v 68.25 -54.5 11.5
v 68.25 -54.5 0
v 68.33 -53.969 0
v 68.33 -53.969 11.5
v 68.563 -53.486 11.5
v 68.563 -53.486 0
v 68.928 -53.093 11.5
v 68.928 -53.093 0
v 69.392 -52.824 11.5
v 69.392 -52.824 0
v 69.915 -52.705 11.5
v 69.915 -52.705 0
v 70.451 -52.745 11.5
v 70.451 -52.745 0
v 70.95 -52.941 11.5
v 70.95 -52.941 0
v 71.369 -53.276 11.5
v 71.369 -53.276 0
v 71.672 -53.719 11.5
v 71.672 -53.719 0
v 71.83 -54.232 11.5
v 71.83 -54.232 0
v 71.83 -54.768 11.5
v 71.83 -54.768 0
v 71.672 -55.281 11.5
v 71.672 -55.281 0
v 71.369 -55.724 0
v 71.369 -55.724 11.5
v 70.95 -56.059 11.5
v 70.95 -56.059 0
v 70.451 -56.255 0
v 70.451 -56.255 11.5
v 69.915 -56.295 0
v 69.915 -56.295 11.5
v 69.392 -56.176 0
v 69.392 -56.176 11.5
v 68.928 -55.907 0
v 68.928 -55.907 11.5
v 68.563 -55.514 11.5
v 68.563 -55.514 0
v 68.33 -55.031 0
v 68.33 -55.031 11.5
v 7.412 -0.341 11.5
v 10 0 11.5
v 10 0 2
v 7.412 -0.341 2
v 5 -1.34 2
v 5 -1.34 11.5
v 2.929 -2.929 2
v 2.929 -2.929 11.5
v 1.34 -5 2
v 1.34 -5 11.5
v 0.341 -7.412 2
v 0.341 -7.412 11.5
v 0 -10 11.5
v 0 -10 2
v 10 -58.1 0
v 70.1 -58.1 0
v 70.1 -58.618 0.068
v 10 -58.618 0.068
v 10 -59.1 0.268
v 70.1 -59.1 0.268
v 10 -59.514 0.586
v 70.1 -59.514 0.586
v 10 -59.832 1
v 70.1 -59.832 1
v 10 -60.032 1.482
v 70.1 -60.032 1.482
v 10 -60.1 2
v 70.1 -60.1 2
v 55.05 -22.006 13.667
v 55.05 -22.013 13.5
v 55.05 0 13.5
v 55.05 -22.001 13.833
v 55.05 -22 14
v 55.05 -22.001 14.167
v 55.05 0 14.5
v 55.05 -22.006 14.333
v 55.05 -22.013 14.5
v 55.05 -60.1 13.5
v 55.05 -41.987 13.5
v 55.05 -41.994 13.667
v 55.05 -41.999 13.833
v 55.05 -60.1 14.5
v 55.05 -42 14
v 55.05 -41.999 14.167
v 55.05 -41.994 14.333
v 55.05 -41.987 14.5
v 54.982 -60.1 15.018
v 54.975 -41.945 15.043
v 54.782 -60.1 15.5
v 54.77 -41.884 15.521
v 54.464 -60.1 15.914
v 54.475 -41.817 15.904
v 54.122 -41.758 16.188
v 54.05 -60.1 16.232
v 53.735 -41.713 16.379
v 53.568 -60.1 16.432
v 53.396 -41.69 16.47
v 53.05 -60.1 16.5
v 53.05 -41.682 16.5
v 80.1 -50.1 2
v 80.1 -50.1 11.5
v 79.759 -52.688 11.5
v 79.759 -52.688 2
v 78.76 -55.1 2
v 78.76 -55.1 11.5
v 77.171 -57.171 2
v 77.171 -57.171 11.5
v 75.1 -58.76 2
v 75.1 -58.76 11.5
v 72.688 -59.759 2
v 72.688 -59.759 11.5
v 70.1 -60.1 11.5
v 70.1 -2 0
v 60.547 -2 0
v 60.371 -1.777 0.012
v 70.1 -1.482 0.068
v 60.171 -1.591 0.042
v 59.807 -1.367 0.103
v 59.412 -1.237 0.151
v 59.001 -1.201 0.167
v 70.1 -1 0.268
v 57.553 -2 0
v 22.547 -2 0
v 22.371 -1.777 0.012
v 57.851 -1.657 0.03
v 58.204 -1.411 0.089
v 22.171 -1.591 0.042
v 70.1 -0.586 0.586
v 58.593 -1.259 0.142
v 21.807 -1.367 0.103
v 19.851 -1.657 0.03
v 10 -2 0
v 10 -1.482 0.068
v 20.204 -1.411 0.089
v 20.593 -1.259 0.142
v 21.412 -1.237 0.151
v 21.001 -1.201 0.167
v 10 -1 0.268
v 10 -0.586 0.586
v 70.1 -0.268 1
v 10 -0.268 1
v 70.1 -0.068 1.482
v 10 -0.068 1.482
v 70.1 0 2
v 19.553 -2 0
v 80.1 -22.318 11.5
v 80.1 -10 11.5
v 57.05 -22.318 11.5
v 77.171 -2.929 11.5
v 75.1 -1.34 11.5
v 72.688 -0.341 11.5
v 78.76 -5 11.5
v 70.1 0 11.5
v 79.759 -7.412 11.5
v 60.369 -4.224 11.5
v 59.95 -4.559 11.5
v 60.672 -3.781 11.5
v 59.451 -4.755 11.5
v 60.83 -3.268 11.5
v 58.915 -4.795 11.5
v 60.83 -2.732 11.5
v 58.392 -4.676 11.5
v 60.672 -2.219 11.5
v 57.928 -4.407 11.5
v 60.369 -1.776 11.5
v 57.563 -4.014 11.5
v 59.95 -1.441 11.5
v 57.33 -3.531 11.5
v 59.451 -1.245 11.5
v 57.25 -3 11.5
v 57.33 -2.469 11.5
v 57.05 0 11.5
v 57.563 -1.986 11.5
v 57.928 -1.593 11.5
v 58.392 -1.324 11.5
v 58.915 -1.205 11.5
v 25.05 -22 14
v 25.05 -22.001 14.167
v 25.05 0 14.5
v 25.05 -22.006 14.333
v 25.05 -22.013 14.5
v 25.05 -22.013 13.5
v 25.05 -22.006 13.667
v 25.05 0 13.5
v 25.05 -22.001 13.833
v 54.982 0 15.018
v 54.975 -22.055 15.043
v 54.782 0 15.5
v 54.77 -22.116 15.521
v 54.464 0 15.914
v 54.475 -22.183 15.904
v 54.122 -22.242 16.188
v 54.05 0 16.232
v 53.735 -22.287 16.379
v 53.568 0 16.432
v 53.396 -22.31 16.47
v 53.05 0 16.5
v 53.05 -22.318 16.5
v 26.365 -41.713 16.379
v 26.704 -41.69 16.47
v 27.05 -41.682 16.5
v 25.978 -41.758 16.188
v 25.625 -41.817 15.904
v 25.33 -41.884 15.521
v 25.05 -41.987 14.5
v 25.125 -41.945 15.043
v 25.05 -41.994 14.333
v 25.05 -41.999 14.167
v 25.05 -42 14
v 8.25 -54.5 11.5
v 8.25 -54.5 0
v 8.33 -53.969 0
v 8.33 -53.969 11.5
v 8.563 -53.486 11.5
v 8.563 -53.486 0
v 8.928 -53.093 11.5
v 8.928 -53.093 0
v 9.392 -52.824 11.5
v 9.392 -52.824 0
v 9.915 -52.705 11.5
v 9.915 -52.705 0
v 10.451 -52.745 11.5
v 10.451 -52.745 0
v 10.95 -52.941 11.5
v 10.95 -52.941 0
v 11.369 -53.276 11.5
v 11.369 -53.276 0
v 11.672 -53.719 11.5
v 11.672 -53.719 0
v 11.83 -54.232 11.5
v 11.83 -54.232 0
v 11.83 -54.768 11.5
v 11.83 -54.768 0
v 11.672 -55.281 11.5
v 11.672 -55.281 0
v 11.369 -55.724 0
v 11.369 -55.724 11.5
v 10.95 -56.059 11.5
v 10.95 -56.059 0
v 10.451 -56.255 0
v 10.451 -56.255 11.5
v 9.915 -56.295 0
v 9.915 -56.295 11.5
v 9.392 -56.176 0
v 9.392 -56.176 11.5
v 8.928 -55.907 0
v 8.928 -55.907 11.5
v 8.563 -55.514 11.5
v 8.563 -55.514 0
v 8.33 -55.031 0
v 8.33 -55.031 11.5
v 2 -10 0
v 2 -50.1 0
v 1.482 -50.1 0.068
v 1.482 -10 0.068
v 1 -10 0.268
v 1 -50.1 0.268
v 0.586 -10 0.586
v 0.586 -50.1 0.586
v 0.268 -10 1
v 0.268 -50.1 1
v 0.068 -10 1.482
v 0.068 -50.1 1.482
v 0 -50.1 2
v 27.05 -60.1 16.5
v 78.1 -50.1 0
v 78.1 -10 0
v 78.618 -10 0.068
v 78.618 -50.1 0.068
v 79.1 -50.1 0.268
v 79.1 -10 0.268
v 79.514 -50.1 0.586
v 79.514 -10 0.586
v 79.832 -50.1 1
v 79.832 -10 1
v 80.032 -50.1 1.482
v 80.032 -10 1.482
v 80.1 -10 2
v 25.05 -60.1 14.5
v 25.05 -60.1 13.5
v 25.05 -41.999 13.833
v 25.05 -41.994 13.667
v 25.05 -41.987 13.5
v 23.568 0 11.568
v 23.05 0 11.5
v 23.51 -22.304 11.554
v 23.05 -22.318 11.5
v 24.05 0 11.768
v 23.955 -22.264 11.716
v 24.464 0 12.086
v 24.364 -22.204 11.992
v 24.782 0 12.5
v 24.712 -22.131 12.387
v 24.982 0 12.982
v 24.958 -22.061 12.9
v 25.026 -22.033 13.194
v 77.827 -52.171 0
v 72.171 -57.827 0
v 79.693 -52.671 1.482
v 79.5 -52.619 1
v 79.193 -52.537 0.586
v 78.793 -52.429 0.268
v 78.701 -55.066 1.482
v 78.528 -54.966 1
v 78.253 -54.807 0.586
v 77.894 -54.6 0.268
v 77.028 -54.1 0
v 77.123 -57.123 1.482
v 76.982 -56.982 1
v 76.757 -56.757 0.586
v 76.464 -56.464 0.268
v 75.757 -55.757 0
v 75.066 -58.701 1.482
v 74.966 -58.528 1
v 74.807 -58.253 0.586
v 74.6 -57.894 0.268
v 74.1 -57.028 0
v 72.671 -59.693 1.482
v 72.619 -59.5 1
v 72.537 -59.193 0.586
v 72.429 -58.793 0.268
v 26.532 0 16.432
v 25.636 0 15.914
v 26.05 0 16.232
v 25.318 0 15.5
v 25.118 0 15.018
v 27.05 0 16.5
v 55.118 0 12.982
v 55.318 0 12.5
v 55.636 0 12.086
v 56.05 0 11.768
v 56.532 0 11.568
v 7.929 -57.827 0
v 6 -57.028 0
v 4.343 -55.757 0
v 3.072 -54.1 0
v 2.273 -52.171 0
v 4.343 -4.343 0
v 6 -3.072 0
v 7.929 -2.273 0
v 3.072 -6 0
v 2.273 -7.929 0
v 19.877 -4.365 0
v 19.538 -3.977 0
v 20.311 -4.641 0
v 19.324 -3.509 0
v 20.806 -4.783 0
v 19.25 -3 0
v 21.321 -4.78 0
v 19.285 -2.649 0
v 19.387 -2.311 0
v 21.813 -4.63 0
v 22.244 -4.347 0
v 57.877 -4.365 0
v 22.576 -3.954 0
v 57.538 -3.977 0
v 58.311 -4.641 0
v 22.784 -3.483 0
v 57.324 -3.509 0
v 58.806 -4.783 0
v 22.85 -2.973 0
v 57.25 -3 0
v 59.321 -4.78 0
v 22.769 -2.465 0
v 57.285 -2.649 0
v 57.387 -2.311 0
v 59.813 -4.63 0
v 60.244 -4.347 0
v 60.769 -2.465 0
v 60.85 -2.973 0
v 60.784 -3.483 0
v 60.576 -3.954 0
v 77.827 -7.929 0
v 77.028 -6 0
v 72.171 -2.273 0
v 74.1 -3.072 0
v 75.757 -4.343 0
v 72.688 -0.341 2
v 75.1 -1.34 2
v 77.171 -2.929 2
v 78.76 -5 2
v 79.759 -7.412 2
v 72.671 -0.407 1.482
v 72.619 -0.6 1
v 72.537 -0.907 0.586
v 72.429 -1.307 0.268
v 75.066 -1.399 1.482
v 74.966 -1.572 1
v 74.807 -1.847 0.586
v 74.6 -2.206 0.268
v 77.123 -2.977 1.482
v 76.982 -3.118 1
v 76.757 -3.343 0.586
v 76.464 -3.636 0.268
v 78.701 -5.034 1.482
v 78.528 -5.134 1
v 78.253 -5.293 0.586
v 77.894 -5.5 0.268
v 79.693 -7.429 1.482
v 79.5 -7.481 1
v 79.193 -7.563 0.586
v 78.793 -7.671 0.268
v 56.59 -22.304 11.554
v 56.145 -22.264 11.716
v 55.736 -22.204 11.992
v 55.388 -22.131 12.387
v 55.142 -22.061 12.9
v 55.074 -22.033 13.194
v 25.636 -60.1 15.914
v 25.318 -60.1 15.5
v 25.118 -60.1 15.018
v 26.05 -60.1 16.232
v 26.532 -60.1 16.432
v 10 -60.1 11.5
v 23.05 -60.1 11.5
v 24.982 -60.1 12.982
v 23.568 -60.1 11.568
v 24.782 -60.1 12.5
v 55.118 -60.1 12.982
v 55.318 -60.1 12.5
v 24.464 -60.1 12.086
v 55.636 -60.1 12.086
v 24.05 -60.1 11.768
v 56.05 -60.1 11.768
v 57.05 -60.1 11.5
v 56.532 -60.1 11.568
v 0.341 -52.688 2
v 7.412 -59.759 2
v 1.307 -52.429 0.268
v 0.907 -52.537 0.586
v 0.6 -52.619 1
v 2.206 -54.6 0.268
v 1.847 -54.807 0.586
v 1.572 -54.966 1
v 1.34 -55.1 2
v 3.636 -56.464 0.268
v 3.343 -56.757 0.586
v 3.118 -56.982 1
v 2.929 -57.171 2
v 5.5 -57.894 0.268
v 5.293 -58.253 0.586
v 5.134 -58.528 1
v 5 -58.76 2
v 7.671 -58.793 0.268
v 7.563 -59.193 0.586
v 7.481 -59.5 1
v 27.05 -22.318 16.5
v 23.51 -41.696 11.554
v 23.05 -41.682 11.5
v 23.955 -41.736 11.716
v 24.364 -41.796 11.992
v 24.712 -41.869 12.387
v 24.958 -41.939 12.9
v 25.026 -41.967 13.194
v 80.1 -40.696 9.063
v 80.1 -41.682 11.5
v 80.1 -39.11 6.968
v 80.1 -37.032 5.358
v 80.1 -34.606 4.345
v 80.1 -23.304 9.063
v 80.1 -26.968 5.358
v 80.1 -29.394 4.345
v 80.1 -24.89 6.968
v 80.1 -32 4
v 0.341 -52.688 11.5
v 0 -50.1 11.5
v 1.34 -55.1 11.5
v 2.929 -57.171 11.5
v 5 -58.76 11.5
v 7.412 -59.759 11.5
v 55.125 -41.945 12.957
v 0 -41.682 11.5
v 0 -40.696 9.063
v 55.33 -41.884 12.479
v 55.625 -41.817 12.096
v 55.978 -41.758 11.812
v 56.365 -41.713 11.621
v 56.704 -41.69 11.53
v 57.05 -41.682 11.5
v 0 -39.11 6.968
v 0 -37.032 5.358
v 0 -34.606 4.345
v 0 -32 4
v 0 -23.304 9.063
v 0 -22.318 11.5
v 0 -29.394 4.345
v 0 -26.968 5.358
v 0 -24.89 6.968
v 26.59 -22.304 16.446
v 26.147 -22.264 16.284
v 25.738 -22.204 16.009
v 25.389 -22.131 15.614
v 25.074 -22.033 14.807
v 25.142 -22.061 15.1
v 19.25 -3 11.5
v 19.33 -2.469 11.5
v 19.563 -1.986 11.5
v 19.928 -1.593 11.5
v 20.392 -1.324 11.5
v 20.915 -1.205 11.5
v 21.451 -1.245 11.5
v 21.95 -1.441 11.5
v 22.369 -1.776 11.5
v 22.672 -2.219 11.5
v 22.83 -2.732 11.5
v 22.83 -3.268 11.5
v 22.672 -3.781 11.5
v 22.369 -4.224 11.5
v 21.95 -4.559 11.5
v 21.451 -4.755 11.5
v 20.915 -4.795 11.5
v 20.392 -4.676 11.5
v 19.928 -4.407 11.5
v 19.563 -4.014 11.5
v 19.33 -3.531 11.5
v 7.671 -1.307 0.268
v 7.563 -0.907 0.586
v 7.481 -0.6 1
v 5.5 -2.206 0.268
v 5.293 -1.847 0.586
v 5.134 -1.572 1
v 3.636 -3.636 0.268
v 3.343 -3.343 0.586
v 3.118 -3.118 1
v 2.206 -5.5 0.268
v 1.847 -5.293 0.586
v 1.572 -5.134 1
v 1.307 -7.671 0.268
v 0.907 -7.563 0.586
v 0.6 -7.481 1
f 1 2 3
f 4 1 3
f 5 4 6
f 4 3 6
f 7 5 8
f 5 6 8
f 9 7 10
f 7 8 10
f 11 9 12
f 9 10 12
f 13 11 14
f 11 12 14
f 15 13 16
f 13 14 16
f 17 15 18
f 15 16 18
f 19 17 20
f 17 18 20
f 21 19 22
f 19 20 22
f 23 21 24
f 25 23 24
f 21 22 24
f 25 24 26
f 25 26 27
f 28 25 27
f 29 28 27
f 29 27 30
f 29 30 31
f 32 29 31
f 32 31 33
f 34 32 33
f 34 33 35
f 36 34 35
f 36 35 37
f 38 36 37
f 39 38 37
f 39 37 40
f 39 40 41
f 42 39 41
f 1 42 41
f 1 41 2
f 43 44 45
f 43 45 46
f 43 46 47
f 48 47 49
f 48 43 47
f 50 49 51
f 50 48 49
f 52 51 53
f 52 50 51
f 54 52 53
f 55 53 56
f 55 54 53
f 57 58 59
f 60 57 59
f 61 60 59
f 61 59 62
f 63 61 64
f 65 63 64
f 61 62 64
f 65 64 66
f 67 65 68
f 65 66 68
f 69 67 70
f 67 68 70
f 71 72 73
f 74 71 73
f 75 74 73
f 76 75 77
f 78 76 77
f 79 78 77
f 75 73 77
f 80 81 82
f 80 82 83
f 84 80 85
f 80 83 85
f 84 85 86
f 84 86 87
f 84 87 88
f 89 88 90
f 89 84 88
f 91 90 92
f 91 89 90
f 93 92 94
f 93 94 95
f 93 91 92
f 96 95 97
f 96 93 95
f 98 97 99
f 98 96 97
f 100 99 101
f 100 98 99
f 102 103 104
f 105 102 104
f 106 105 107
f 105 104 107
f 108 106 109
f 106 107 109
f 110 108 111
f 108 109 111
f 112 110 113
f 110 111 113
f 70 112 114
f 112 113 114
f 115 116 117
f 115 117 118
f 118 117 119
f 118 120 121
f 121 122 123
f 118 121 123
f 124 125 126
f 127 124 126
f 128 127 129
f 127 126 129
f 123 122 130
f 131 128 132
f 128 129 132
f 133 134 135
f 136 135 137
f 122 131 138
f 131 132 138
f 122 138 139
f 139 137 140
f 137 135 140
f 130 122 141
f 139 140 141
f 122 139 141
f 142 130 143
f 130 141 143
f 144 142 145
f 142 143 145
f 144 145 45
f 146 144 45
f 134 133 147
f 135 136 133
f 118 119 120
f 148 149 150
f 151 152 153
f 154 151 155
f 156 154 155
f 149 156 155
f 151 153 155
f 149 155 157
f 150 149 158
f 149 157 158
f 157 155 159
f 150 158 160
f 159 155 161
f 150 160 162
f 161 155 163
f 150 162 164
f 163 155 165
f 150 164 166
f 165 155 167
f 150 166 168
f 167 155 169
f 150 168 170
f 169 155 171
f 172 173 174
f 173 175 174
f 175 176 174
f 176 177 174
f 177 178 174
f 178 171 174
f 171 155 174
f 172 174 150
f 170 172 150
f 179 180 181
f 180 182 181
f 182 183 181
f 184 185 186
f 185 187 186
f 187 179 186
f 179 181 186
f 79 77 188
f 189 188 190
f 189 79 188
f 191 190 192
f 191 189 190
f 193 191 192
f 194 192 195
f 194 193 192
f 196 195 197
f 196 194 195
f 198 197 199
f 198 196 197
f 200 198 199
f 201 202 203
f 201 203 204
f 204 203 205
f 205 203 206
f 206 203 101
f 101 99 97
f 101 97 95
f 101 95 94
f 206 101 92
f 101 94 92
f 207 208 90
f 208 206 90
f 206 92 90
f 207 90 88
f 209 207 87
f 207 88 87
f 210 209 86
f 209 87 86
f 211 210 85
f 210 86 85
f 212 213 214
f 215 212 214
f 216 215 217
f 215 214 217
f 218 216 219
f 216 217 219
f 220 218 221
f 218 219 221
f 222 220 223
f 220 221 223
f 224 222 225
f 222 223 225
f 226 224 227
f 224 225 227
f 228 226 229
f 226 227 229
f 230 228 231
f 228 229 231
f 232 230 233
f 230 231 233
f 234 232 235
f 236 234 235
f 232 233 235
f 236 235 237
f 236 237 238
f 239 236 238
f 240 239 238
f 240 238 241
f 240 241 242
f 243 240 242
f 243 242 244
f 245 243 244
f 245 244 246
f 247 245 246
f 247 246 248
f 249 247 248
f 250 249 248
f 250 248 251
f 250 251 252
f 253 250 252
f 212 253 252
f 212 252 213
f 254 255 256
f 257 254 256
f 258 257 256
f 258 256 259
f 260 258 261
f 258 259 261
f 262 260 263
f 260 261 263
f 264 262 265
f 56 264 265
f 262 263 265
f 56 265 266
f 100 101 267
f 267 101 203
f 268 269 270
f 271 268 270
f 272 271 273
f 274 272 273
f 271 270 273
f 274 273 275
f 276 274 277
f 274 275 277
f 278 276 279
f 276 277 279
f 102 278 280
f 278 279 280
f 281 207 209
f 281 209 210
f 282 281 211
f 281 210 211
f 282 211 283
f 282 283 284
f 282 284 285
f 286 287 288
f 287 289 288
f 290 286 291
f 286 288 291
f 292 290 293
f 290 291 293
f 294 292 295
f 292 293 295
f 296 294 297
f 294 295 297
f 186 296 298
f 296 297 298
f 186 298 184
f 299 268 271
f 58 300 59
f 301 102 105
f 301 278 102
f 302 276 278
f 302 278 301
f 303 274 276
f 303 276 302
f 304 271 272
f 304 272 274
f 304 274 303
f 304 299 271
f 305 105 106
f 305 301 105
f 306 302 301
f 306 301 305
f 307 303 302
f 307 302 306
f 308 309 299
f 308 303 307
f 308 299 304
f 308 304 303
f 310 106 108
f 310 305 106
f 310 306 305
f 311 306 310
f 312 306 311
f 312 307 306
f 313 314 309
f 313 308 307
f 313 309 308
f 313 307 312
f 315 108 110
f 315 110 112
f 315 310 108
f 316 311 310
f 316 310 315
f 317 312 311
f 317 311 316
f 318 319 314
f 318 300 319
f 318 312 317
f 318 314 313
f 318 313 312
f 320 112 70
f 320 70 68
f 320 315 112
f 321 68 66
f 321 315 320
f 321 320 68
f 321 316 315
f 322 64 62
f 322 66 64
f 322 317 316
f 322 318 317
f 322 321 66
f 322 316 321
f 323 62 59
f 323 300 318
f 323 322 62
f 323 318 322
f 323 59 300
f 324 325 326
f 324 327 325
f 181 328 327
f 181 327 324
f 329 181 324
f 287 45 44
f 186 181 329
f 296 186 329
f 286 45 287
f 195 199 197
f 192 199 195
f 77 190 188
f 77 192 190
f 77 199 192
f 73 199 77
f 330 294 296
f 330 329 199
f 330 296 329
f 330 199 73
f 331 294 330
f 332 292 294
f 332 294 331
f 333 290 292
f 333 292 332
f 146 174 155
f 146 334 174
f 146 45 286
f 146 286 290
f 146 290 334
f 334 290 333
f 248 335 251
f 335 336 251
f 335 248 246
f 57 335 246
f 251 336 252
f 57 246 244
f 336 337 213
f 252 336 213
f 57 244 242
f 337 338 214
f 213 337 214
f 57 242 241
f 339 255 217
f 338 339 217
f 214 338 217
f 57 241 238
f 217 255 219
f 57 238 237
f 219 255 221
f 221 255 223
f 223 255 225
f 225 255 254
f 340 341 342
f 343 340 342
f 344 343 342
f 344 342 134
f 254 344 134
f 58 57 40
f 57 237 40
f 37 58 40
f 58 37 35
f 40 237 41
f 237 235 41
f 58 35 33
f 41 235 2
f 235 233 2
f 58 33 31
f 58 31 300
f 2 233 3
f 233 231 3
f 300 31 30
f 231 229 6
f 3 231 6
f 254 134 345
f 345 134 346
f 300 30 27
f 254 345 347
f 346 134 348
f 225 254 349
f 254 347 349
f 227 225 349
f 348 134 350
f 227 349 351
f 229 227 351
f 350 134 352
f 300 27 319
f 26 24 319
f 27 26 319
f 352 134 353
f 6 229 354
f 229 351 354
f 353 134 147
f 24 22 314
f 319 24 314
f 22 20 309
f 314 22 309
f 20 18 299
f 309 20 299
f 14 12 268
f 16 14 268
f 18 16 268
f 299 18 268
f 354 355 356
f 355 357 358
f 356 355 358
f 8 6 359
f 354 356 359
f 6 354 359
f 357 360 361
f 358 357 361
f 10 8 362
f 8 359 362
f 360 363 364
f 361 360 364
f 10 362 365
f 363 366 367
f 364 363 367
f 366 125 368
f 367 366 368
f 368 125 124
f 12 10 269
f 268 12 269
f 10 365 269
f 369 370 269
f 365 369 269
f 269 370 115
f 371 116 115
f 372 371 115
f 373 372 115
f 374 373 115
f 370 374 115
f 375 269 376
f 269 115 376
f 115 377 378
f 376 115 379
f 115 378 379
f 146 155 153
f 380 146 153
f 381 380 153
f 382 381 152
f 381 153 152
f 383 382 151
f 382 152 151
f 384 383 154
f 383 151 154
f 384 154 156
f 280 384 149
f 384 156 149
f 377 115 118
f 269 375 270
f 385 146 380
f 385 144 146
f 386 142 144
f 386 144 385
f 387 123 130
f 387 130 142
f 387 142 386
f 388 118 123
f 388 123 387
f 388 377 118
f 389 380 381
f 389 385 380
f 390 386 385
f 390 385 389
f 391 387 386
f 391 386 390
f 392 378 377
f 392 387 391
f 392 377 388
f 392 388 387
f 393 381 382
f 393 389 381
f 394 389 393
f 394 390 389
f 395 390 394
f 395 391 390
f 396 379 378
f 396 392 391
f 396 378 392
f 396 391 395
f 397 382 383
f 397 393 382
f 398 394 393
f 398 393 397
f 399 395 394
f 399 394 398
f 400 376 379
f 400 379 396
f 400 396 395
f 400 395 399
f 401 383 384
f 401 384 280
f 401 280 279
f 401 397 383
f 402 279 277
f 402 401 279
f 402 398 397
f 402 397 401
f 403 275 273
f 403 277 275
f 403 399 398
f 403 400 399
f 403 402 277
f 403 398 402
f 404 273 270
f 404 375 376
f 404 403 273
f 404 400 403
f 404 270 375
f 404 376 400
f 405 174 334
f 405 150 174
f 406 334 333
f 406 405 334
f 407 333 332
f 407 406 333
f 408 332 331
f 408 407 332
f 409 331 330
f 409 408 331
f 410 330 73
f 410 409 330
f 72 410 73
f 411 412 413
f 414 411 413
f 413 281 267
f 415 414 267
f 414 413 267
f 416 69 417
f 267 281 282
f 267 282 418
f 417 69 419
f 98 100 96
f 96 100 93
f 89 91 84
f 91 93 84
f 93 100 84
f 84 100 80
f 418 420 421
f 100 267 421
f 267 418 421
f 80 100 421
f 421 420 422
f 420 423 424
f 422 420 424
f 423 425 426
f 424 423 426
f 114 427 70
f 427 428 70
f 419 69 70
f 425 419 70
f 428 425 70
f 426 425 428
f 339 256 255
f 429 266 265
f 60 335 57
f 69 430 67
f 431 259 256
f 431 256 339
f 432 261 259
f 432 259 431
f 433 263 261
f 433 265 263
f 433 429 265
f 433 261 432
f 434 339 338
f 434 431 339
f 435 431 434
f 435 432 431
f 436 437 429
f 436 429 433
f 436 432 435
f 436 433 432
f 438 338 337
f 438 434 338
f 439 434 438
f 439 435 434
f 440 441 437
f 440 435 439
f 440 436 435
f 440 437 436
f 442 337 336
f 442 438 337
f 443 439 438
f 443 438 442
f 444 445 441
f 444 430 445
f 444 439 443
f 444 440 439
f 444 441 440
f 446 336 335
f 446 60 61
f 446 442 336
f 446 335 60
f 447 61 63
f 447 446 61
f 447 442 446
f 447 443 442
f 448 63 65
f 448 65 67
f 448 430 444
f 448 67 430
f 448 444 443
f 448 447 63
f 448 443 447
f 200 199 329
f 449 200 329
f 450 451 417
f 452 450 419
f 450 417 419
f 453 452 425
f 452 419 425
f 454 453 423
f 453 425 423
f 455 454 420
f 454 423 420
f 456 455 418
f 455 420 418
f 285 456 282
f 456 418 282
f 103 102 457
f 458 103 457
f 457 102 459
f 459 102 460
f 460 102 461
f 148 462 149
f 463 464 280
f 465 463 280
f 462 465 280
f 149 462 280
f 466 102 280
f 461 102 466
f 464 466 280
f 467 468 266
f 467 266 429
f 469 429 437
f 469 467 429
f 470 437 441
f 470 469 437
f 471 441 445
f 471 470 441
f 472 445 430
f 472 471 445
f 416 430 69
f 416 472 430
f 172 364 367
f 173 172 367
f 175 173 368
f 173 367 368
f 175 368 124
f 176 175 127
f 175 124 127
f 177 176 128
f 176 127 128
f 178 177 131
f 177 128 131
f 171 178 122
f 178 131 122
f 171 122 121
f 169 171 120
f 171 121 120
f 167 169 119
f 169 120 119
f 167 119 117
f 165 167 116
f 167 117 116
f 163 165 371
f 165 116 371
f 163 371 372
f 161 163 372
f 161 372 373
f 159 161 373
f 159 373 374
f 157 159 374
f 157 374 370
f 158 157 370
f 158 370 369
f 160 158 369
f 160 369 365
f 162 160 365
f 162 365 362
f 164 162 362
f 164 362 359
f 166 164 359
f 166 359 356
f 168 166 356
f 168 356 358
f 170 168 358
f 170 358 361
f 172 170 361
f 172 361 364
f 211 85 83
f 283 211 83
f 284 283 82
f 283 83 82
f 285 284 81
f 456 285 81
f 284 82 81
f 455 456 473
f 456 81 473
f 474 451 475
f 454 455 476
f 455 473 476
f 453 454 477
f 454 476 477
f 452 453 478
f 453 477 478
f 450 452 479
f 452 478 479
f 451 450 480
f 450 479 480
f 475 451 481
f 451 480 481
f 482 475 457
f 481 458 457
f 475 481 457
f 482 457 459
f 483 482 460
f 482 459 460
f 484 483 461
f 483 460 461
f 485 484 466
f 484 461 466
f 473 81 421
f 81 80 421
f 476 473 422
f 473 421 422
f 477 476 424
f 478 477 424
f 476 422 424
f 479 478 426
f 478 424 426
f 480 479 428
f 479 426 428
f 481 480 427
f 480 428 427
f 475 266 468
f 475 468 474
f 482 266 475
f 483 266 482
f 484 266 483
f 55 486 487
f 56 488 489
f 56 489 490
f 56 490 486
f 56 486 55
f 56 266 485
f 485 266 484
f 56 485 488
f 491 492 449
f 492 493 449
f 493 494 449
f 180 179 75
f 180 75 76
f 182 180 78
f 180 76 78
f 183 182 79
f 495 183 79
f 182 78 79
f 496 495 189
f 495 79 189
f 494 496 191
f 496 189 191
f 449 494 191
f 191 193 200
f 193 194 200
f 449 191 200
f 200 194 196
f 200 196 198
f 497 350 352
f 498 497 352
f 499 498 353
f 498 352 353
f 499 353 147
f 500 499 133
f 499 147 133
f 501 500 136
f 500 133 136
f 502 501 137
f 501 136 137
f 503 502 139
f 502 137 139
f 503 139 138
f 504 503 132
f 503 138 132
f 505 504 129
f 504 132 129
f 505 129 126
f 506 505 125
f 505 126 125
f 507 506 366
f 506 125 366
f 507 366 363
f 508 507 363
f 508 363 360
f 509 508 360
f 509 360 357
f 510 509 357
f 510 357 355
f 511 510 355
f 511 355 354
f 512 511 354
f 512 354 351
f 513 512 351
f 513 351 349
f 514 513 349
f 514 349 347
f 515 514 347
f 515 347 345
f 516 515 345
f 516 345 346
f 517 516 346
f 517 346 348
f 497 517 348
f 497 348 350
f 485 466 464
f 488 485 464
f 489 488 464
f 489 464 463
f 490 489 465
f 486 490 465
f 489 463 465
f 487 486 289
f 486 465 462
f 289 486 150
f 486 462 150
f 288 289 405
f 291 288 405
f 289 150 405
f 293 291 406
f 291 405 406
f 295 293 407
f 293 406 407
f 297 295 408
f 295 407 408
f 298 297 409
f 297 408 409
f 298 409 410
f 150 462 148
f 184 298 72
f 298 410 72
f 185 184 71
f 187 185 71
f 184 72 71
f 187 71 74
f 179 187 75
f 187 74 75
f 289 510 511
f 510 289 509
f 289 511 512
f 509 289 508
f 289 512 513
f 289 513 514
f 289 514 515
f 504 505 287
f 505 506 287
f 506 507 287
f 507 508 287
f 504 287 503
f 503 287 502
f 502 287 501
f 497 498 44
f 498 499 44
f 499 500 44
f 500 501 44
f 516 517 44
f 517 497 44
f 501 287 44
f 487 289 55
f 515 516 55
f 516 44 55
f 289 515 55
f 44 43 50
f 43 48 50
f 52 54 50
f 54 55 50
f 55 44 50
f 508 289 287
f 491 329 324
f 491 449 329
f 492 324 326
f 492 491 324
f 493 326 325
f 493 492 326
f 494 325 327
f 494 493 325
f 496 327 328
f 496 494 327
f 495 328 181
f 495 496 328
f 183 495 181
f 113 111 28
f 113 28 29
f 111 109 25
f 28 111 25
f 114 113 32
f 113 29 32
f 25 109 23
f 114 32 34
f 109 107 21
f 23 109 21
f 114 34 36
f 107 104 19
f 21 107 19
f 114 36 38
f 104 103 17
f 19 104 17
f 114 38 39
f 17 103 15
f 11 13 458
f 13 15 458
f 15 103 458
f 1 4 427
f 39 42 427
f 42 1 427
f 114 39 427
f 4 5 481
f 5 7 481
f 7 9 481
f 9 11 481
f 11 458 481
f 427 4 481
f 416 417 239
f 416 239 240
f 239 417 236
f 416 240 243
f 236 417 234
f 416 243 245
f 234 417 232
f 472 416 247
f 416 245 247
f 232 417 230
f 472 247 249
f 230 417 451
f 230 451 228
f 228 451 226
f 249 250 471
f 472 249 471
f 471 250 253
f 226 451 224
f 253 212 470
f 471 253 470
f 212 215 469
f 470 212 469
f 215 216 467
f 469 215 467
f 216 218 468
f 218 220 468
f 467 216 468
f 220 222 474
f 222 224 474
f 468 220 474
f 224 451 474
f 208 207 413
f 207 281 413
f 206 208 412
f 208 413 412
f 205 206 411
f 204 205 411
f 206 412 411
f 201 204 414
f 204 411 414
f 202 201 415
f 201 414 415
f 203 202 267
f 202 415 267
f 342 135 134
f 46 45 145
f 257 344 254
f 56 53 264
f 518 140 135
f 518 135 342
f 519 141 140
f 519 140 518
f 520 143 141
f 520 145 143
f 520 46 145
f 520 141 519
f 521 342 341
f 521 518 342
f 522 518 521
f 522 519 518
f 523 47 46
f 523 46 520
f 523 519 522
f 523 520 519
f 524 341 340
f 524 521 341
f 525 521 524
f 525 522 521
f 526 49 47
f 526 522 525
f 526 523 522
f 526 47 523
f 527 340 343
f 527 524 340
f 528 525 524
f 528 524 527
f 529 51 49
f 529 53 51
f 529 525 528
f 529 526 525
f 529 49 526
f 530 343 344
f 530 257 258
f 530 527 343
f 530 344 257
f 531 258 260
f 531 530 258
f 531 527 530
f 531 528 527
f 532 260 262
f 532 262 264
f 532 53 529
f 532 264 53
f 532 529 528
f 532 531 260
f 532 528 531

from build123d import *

# Parameters (mm, degrees)
SKETCH_1_W          = 80.1
SKETCH_1_H          = 60.1
EXTRUDE_1_DEPTH     = 28
CUT_EXTRUDE_1_DEPTH = 108
CUT_EXTRUDE_2_DEPTH = 80
FILLET_1_R          = 2
SKETCH_4_R          = 1.8
CUT_EXTRUDE_3_DEPTH = 80
FILLET_2_R          = 10
FILLET_3_R          = 2


with BuildPart() as part:
    # 草图1 → 凸台-拉伸1 (new body)
    with BuildSketch(Plane.XY):
        with Locations((40.05, -30.05)):
            Rectangle(SKETCH_1_W, SKETCH_1_H)
    extrude(amount=EXTRUDE_1_DEPTH)

    # 草图2 → 切除-拉伸1 (cut)
    with BuildSketch(Plane(origin=(80.1, 0, 0), x_dir=(0, 0, -1), z_dir=(1, 0, 0))):
        with BuildLine():
            ThreePointArc((-4, -32), (-6.928932188, -24.928932188), (-14, -22))
            Line((-14, -22), (-14, -32))
            Line((-14, -32), (-4, -32))
        make_face()
        with BuildLine():
            Line((-14, -32), (-14, -22))
            ThreePointArc((-14, -22), (-21.071067812, -24.928932188), (-24, -32))
            Line((-24, -32), (-14, -32))
        make_face()
        with BuildLine():
            Line((-4, -32), (-14, -32))
            Line((-14, -32), (-14, -42))
            ThreePointArc((-14, -42), (-6.928932188, -39.071067812), (-4, -32))
        make_face()
        with BuildLine():
            Line((-14, -42), (-14, -32))
            Line((-14, -32), (-24, -32))
            ThreePointArc((-24, -32), (-21.071067812, -39.071067812), (-14, -42))
        make_face()
    extrude(amount=-CUT_EXTRUDE_1_DEPTH, mode=Mode.SUBTRACT)

    # 草图3 → 切除-拉伸2 (cut)
    with BuildSketch(Plane(origin=(0, 0, 0), x_dir=(1, 0, 0), z_dir=(0, 1, 0))):
        Polygon((25.05, -11.5), (0, -11.5), (0, -28), (80.1, -28), (80.1, -11.5), (55.05, -11.5), (55.05, -16.5), (25.05, -16.5), align=None)
    extrude(amount=-CUT_EXTRUDE_2_DEPTH, mode=Mode.SUBTRACT)

    # 圆角1
    fillet_1_edges = [part.edges().sort_by_distance(p)[0] for p in [
        (55.05, -50.891229183, 11.5),
        (55.05, -11.158770817, 11.5),
        (25.05, -50.891229183, 11.5),
        (25.05, -11.158770817, 11.5),
        (25.05, -50.891229183, 16.5),
        (25.05, -11.158770817, 16.5),
        (55.05, -50.891229183, 16.5),
        (55.05, -11.158770817, 16.5),
    ]]
    fillet(fillet_1_edges, radius=FILLET_1_R)

    # 草图4 → 切除-拉伸3 (cut)
    with BuildSketch(Plane(origin=(0, 0, 0), x_dir=(-1, 0, 0), z_dir=(0, 0, -1))):
        with Locations((-70.05, -54.5)):
            Circle(SKETCH_4_R)
        with Locations((-10.05, -54.5)):
            Circle(SKETCH_4_R)
        with Locations((-21.05, -3)):
            Circle(SKETCH_4_R)
        with Locations((-59.05, -3)):
            Circle(SKETCH_4_R)
    extrude(amount=-CUT_EXTRUDE_3_DEPTH, mode=Mode.SUBTRACT)

    # 圆角2
    fillet_2_edges = [part.edges().sort_by_distance(p)[0] for p in [
        (0, 0, 5.75),
        (80.1, 0, 5.75),
        (80.1, -60.1, 5.75),
        (0, -60.1, 5.75),
    ]]
    fillet(fillet_2_edges, radius=FILLET_2_R)

    # 圆角3
    # the kernel refuses this fillet: 2 mm, written as the material it takes off along each edge
    with BuildSketch(Plane(origin=(80.1, -10, 0), x_dir=(-1, 0, 0), z_dir=(0, -1, 0)), Plane(origin=(0, -50.1, 0), x_dir=(1, 0, 0), z_dir=(0, 1, 0))) as fillet_3_piece_1:
        with BuildLine():
            CenterArc((FILLET_3_R, -FILLET_3_R), FILLET_3_R, 90, 90)
            Line((0, -FILLET_3_R), (0, 0))
            Line((0, 0), (FILLET_3_R, 0))
        make_face()
    extrude(amount=40.1, mode=Mode.SUBTRACT)
    with BuildSketch(Plane(origin=(10, 0, 0), x_dir=(0, 0, 1), z_dir=(1, 0, 0))) as fillet_3_piece_2:
        with BuildLine():
            CenterArc((FILLET_3_R, FILLET_3_R), FILLET_3_R, 180, 90)
            Line((0, FILLET_3_R), (0, 0))
            Line((0, 0), (FILLET_3_R, 0))
        make_face()
    extrude(amount=60.1, mode=Mode.SUBTRACT)
    with BuildSketch(Plane(origin=(70.1, -60.1, 0), x_dir=(0, 1, 0), z_dir=(-1, 0, 0))) as fillet_3_piece_3:
        with BuildLine():
            CenterArc((FILLET_3_R, -FILLET_3_R), FILLET_3_R, 90, 90)
            Line((0, -FILLET_3_R), (0, 0))
            Line((0, 0), (FILLET_3_R, 0))
        make_face()
    extrude(amount=60.1, mode=Mode.SUBTRACT)
    with BuildSketch(Plane(origin=(10, -10, 0), x_dir=(0, 1, 0), z_dir=(1, 0, 0))) as fillet_3_piece_4:
        with BuildLine():
            CenterArc((10 - FILLET_3_R, FILLET_3_R), FILLET_3_R, 270, 90)
            Line((10, FILLET_3_R), (10, 0))
            Line((10, 0), (10 - FILLET_3_R, 0))
        make_face()
    revolve(axis=Axis((10, -10, 0), (0, 0, 1)), revolution_arc=90, mode=Mode.SUBTRACT)
    with BuildSketch(Plane(origin=(10, -50.1, 0), x_dir=(-1, 0, 0), z_dir=(0, 1, 0))) as fillet_3_piece_5:
        with BuildLine():
            CenterArc((10 - FILLET_3_R, FILLET_3_R), FILLET_3_R, 270, 90)
            Line((10, FILLET_3_R), (10, 0))
            Line((10, 0), (10 - FILLET_3_R, 0))
        make_face()
    revolve(axis=Axis((10, -50.1, 0), (0, 0, 1)), revolution_arc=90, mode=Mode.SUBTRACT)
    with BuildSketch(Plane(origin=(70.1, -10, 0), x_dir=(0, 1, 0), z_dir=(-1, 0, 0))) as fillet_3_piece_6:
        with BuildLine():
            CenterArc((10 - FILLET_3_R, -FILLET_3_R), FILLET_3_R, 0, 90)
            Line((10 - FILLET_3_R, 0), (10, 0))
            Line((10, 0), (10, -FILLET_3_R))
        make_face()
    revolve(axis=Axis((70.1, -10, 0), (0, 0, -1)), revolution_arc=90, mode=Mode.SUBTRACT)
    with BuildSketch(Plane(origin=(70.1, -50.1, 0), x_dir=(1, 0, 0), z_dir=(0, 1, 0))) as fillet_3_piece_7:
        with BuildLine():
            CenterArc((10 - FILLET_3_R, -FILLET_3_R), FILLET_3_R, 0, 90)
            Line((10, -FILLET_3_R), (10, 0))
            Line((10, 0), (10 - FILLET_3_R, 0))
        make_face()
    revolve(axis=Axis((70.1, -50.1, 0), (0, 0, -1)), revolution_arc=90, mode=Mode.SUBTRACT)


solid = part.part
